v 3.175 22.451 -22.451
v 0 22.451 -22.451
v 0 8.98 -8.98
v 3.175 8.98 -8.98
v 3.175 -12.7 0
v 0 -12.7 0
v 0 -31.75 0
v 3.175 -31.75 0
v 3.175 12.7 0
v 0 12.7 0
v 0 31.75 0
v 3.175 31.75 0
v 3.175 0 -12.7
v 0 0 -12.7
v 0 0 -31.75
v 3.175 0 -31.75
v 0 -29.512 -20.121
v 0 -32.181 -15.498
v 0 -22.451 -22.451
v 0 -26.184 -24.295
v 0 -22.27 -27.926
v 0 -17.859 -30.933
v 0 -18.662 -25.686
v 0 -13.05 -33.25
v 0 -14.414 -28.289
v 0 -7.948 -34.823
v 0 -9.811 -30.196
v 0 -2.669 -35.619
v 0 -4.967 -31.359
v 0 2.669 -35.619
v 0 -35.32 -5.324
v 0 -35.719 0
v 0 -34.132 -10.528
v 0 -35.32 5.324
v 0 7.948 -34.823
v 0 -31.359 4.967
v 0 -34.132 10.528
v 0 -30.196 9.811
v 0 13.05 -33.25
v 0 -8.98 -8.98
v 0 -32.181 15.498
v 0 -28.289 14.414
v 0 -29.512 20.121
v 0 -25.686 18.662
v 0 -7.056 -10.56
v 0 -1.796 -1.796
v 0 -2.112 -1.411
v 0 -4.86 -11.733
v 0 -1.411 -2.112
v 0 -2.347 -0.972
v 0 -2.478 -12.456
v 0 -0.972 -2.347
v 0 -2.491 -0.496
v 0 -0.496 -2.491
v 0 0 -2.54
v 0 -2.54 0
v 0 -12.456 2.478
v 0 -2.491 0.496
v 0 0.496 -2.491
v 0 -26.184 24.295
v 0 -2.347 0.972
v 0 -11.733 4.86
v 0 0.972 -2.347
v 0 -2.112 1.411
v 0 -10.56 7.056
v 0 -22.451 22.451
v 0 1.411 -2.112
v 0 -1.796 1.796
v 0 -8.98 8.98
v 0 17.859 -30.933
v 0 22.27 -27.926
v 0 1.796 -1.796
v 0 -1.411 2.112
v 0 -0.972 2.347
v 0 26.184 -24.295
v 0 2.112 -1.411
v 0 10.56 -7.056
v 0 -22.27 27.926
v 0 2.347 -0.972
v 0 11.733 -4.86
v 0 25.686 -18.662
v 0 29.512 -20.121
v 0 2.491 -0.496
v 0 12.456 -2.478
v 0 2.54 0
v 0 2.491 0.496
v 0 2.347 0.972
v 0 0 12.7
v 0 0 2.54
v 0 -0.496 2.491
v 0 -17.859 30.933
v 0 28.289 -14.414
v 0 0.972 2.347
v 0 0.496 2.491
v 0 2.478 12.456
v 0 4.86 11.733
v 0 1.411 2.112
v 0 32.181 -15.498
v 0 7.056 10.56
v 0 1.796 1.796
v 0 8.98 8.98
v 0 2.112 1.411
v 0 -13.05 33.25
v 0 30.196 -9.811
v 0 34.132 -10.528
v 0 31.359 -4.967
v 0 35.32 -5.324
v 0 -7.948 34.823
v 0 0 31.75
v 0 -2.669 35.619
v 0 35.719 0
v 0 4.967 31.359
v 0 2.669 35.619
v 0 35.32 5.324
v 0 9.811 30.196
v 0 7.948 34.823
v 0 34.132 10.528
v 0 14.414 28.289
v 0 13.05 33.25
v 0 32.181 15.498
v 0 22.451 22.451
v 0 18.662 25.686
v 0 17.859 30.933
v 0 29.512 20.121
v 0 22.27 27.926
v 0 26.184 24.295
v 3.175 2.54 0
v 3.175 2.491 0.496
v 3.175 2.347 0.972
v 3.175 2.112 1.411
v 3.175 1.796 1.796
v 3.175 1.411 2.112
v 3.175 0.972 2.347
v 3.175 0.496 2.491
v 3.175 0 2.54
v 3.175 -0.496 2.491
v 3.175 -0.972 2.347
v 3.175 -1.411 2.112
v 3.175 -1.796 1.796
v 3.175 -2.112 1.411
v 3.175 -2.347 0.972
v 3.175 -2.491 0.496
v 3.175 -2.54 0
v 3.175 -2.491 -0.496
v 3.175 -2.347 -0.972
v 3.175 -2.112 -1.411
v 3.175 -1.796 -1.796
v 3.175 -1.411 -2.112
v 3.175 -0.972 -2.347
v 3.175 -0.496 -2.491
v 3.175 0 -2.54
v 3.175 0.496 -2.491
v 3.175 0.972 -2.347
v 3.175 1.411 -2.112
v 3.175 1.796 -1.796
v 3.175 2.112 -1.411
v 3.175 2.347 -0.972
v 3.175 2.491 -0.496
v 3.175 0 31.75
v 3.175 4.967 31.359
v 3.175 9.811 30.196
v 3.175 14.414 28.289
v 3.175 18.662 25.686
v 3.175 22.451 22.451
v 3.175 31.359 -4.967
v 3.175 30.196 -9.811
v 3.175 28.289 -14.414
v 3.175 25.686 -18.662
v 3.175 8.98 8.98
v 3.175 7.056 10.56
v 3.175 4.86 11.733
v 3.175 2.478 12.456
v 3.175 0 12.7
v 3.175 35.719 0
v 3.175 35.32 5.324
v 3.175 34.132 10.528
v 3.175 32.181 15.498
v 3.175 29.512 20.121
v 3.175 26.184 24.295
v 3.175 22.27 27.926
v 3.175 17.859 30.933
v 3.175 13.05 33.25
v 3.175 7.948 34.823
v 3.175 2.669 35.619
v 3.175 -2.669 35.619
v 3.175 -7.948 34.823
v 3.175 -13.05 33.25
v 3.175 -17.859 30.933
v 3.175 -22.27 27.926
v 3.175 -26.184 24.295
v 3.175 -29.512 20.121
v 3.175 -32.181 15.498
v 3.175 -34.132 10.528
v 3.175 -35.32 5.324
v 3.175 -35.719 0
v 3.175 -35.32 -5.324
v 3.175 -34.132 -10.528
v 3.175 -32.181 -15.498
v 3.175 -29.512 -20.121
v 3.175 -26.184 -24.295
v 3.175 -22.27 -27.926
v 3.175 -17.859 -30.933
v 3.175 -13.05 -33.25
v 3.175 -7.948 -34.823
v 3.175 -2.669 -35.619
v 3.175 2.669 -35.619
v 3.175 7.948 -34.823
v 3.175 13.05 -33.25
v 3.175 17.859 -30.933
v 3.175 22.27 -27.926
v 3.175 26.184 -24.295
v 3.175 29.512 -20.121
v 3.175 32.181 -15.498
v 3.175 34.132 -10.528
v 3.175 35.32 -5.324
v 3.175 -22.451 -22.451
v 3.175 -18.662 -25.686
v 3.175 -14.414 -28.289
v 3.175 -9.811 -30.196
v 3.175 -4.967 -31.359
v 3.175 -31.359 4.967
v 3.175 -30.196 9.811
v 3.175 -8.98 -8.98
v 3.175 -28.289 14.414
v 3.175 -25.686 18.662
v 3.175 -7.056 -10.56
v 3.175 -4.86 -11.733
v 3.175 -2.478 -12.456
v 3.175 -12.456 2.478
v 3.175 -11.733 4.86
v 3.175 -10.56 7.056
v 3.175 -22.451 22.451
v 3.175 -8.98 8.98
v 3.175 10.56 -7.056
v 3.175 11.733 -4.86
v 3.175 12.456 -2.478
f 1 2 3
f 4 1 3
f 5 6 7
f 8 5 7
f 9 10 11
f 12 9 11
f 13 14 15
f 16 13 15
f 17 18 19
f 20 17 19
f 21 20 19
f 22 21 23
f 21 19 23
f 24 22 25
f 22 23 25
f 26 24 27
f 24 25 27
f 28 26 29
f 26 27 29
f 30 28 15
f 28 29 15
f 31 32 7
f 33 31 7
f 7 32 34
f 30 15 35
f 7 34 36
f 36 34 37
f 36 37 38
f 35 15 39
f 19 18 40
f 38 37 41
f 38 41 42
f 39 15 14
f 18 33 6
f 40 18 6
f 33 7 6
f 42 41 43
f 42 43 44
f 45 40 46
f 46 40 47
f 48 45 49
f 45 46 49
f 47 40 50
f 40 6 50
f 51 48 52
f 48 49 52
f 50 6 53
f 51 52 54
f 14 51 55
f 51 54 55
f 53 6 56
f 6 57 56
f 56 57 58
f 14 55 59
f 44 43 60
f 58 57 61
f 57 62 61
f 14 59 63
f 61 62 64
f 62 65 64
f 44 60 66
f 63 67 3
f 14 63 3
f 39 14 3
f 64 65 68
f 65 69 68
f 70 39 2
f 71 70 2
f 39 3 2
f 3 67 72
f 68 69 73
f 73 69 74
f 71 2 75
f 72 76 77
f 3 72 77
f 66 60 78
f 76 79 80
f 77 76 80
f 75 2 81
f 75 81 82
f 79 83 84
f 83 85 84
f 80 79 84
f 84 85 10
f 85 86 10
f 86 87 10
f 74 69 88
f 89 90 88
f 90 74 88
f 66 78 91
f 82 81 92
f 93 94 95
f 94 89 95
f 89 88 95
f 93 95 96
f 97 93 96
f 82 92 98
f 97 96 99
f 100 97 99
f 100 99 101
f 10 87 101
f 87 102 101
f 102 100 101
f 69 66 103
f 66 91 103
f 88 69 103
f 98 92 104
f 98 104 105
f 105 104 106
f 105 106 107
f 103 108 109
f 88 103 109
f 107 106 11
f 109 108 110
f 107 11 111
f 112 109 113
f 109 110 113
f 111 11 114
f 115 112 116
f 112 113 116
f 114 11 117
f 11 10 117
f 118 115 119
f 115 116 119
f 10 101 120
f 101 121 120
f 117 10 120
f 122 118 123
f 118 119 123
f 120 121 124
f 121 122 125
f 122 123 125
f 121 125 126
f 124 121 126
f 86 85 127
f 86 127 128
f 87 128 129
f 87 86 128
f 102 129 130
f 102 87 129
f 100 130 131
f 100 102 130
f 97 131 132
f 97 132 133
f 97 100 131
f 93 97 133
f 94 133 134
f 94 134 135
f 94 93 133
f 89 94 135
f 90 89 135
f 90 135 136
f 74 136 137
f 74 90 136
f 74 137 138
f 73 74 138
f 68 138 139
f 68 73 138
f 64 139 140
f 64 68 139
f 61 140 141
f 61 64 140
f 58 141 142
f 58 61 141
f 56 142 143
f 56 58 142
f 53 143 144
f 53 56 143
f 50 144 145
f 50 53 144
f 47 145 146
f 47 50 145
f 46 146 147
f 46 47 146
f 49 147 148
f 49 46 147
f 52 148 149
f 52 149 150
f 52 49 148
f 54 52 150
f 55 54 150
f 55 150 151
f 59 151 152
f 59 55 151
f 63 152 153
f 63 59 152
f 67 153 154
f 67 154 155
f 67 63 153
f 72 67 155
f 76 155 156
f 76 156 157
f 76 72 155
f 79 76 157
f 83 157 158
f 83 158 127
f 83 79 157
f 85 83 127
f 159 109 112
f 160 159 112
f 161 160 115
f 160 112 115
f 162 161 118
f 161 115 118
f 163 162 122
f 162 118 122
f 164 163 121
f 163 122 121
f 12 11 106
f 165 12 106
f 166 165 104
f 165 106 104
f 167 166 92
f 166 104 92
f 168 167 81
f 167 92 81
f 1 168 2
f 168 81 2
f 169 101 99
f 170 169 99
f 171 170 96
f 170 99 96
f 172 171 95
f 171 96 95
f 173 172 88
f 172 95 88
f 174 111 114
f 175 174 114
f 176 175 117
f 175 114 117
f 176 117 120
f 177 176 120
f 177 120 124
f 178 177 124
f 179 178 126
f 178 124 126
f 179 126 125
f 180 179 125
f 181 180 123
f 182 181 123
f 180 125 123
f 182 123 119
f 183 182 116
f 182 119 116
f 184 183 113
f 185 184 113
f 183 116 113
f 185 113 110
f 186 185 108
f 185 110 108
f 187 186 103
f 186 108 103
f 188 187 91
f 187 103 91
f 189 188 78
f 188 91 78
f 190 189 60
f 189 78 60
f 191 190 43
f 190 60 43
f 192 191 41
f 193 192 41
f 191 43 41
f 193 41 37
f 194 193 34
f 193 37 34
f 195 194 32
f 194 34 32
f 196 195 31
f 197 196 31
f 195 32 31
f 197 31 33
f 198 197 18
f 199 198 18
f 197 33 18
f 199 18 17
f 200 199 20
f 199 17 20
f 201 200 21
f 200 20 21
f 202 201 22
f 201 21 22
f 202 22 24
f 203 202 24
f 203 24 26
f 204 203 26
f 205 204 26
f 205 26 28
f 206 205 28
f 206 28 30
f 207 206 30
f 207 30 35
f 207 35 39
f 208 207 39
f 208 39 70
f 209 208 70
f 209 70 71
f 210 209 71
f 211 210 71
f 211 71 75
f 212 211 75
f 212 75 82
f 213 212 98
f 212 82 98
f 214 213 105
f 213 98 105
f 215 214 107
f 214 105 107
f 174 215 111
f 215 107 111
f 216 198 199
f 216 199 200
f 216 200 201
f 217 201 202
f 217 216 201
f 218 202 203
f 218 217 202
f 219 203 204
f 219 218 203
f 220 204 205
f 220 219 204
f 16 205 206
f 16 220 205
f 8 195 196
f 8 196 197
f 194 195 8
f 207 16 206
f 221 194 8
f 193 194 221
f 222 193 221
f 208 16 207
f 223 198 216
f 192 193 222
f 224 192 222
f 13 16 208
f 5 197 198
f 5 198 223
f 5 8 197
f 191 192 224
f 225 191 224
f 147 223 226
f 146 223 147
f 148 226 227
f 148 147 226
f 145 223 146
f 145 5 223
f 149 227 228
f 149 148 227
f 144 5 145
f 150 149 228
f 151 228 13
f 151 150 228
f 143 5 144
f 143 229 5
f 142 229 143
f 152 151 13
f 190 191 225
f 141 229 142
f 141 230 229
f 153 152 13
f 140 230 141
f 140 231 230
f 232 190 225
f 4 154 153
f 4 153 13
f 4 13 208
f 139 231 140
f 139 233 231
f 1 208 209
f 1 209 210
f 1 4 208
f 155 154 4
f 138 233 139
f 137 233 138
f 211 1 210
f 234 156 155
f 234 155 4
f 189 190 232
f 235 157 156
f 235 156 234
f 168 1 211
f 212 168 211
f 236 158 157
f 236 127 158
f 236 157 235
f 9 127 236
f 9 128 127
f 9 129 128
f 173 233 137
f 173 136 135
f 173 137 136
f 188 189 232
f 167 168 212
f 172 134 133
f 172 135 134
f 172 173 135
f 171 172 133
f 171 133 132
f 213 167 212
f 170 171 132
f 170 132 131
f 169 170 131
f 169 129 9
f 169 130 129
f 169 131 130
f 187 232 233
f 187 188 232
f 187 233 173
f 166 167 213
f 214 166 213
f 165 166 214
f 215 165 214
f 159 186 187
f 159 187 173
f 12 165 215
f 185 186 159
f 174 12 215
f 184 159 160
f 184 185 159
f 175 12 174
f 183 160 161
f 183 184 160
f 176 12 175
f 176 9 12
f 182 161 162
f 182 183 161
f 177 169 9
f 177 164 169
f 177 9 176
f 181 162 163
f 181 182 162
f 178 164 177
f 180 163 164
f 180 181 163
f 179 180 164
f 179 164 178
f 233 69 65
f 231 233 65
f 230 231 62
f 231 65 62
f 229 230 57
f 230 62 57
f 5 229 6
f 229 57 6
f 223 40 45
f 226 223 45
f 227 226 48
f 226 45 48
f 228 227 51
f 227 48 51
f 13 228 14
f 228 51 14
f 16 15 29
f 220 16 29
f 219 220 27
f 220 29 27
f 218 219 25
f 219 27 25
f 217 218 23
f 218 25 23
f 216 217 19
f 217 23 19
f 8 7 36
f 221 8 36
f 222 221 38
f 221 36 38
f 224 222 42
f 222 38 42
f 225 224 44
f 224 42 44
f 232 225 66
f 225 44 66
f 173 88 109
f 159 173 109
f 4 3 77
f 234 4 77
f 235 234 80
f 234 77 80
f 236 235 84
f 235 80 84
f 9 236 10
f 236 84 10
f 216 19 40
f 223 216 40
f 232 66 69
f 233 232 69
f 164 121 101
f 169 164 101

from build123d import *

# Parameters (mm, degrees)
F0_R     = 35.71875
F0_R_2   = 2.54
F1_DEPTH = 3.175


# Not quite as in the source:
# - a length typed as a fraction of an inch, garbled in the dataset ("3 / 203.2 mm" for 3/8 in), is restored


with BuildPart() as f1:
    # F0 (on Right) → F1 (new body)
    with BuildSketch(Plane.YZ):
        Circle(F0_R)
        with BuildLine():
            ThreePointArc((0, -31.75), (-12.1501989776, -29.3331751572), (-22.4506403027, -22.4506403027))
            Line((-22.4506403027, -22.4506403027), (-8.9802561211, -8.9802561211))
            ThreePointArc((-8.9802561211, -8.9802561211), (-4.860079591, -11.7332700629), (0, -12.7))
            Line((0, -12.7), (0, -31.75))
        make_face(mode=Mode.SUBTRACT)
        with BuildLine():
            ThreePointArc((8.9802561211, -8.9802561211), (11.7332700629, -4.860079591), (12.7, 0))
            Line((12.7, 0), (31.75, 0))
            ThreePointArc((31.75, 0), (29.3331751572, -12.1501989776), (22.4506403027, -22.4506403027))
            Line((22.4506403027, -22.4506403027), (8.9802561211, -8.9802561211))
        make_face(mode=Mode.SUBTRACT)
        with BuildLine():
            ThreePointArc((-8.9802561211, 8.9802561211), (-11.7332700629, 4.860079591), (-12.7, 0))
            Line((-12.7, 0), (-31.75, 0))
            ThreePointArc((-31.75, 0), (-29.3331751572, 12.1501989776), (-22.4506403027, 22.4506403027))
            Line((-22.4506403027, 22.4506403027), (-8.9802561211, 8.9802561211))
        make_face(mode=Mode.SUBTRACT)
        Circle(F0_R_2, mode=Mode.SUBTRACT)
        with BuildLine():
            ThreePointArc((8.9802561211, 8.9802561211), (4.860079591, 11.7332700629), (0, 12.7))
            Line((0, 12.7), (0, 31.75))
            ThreePointArc((0, 31.75), (12.1501989776, 29.3331751572), (22.4506403027, 22.4506403027))
            Line((22.4506403027, 22.4506403027), (8.9802561211, 8.9802561211))
        make_face(mode=Mode.SUBTRACT)
    extrude(amount=F1_DEPTH)


solid = f1.part
